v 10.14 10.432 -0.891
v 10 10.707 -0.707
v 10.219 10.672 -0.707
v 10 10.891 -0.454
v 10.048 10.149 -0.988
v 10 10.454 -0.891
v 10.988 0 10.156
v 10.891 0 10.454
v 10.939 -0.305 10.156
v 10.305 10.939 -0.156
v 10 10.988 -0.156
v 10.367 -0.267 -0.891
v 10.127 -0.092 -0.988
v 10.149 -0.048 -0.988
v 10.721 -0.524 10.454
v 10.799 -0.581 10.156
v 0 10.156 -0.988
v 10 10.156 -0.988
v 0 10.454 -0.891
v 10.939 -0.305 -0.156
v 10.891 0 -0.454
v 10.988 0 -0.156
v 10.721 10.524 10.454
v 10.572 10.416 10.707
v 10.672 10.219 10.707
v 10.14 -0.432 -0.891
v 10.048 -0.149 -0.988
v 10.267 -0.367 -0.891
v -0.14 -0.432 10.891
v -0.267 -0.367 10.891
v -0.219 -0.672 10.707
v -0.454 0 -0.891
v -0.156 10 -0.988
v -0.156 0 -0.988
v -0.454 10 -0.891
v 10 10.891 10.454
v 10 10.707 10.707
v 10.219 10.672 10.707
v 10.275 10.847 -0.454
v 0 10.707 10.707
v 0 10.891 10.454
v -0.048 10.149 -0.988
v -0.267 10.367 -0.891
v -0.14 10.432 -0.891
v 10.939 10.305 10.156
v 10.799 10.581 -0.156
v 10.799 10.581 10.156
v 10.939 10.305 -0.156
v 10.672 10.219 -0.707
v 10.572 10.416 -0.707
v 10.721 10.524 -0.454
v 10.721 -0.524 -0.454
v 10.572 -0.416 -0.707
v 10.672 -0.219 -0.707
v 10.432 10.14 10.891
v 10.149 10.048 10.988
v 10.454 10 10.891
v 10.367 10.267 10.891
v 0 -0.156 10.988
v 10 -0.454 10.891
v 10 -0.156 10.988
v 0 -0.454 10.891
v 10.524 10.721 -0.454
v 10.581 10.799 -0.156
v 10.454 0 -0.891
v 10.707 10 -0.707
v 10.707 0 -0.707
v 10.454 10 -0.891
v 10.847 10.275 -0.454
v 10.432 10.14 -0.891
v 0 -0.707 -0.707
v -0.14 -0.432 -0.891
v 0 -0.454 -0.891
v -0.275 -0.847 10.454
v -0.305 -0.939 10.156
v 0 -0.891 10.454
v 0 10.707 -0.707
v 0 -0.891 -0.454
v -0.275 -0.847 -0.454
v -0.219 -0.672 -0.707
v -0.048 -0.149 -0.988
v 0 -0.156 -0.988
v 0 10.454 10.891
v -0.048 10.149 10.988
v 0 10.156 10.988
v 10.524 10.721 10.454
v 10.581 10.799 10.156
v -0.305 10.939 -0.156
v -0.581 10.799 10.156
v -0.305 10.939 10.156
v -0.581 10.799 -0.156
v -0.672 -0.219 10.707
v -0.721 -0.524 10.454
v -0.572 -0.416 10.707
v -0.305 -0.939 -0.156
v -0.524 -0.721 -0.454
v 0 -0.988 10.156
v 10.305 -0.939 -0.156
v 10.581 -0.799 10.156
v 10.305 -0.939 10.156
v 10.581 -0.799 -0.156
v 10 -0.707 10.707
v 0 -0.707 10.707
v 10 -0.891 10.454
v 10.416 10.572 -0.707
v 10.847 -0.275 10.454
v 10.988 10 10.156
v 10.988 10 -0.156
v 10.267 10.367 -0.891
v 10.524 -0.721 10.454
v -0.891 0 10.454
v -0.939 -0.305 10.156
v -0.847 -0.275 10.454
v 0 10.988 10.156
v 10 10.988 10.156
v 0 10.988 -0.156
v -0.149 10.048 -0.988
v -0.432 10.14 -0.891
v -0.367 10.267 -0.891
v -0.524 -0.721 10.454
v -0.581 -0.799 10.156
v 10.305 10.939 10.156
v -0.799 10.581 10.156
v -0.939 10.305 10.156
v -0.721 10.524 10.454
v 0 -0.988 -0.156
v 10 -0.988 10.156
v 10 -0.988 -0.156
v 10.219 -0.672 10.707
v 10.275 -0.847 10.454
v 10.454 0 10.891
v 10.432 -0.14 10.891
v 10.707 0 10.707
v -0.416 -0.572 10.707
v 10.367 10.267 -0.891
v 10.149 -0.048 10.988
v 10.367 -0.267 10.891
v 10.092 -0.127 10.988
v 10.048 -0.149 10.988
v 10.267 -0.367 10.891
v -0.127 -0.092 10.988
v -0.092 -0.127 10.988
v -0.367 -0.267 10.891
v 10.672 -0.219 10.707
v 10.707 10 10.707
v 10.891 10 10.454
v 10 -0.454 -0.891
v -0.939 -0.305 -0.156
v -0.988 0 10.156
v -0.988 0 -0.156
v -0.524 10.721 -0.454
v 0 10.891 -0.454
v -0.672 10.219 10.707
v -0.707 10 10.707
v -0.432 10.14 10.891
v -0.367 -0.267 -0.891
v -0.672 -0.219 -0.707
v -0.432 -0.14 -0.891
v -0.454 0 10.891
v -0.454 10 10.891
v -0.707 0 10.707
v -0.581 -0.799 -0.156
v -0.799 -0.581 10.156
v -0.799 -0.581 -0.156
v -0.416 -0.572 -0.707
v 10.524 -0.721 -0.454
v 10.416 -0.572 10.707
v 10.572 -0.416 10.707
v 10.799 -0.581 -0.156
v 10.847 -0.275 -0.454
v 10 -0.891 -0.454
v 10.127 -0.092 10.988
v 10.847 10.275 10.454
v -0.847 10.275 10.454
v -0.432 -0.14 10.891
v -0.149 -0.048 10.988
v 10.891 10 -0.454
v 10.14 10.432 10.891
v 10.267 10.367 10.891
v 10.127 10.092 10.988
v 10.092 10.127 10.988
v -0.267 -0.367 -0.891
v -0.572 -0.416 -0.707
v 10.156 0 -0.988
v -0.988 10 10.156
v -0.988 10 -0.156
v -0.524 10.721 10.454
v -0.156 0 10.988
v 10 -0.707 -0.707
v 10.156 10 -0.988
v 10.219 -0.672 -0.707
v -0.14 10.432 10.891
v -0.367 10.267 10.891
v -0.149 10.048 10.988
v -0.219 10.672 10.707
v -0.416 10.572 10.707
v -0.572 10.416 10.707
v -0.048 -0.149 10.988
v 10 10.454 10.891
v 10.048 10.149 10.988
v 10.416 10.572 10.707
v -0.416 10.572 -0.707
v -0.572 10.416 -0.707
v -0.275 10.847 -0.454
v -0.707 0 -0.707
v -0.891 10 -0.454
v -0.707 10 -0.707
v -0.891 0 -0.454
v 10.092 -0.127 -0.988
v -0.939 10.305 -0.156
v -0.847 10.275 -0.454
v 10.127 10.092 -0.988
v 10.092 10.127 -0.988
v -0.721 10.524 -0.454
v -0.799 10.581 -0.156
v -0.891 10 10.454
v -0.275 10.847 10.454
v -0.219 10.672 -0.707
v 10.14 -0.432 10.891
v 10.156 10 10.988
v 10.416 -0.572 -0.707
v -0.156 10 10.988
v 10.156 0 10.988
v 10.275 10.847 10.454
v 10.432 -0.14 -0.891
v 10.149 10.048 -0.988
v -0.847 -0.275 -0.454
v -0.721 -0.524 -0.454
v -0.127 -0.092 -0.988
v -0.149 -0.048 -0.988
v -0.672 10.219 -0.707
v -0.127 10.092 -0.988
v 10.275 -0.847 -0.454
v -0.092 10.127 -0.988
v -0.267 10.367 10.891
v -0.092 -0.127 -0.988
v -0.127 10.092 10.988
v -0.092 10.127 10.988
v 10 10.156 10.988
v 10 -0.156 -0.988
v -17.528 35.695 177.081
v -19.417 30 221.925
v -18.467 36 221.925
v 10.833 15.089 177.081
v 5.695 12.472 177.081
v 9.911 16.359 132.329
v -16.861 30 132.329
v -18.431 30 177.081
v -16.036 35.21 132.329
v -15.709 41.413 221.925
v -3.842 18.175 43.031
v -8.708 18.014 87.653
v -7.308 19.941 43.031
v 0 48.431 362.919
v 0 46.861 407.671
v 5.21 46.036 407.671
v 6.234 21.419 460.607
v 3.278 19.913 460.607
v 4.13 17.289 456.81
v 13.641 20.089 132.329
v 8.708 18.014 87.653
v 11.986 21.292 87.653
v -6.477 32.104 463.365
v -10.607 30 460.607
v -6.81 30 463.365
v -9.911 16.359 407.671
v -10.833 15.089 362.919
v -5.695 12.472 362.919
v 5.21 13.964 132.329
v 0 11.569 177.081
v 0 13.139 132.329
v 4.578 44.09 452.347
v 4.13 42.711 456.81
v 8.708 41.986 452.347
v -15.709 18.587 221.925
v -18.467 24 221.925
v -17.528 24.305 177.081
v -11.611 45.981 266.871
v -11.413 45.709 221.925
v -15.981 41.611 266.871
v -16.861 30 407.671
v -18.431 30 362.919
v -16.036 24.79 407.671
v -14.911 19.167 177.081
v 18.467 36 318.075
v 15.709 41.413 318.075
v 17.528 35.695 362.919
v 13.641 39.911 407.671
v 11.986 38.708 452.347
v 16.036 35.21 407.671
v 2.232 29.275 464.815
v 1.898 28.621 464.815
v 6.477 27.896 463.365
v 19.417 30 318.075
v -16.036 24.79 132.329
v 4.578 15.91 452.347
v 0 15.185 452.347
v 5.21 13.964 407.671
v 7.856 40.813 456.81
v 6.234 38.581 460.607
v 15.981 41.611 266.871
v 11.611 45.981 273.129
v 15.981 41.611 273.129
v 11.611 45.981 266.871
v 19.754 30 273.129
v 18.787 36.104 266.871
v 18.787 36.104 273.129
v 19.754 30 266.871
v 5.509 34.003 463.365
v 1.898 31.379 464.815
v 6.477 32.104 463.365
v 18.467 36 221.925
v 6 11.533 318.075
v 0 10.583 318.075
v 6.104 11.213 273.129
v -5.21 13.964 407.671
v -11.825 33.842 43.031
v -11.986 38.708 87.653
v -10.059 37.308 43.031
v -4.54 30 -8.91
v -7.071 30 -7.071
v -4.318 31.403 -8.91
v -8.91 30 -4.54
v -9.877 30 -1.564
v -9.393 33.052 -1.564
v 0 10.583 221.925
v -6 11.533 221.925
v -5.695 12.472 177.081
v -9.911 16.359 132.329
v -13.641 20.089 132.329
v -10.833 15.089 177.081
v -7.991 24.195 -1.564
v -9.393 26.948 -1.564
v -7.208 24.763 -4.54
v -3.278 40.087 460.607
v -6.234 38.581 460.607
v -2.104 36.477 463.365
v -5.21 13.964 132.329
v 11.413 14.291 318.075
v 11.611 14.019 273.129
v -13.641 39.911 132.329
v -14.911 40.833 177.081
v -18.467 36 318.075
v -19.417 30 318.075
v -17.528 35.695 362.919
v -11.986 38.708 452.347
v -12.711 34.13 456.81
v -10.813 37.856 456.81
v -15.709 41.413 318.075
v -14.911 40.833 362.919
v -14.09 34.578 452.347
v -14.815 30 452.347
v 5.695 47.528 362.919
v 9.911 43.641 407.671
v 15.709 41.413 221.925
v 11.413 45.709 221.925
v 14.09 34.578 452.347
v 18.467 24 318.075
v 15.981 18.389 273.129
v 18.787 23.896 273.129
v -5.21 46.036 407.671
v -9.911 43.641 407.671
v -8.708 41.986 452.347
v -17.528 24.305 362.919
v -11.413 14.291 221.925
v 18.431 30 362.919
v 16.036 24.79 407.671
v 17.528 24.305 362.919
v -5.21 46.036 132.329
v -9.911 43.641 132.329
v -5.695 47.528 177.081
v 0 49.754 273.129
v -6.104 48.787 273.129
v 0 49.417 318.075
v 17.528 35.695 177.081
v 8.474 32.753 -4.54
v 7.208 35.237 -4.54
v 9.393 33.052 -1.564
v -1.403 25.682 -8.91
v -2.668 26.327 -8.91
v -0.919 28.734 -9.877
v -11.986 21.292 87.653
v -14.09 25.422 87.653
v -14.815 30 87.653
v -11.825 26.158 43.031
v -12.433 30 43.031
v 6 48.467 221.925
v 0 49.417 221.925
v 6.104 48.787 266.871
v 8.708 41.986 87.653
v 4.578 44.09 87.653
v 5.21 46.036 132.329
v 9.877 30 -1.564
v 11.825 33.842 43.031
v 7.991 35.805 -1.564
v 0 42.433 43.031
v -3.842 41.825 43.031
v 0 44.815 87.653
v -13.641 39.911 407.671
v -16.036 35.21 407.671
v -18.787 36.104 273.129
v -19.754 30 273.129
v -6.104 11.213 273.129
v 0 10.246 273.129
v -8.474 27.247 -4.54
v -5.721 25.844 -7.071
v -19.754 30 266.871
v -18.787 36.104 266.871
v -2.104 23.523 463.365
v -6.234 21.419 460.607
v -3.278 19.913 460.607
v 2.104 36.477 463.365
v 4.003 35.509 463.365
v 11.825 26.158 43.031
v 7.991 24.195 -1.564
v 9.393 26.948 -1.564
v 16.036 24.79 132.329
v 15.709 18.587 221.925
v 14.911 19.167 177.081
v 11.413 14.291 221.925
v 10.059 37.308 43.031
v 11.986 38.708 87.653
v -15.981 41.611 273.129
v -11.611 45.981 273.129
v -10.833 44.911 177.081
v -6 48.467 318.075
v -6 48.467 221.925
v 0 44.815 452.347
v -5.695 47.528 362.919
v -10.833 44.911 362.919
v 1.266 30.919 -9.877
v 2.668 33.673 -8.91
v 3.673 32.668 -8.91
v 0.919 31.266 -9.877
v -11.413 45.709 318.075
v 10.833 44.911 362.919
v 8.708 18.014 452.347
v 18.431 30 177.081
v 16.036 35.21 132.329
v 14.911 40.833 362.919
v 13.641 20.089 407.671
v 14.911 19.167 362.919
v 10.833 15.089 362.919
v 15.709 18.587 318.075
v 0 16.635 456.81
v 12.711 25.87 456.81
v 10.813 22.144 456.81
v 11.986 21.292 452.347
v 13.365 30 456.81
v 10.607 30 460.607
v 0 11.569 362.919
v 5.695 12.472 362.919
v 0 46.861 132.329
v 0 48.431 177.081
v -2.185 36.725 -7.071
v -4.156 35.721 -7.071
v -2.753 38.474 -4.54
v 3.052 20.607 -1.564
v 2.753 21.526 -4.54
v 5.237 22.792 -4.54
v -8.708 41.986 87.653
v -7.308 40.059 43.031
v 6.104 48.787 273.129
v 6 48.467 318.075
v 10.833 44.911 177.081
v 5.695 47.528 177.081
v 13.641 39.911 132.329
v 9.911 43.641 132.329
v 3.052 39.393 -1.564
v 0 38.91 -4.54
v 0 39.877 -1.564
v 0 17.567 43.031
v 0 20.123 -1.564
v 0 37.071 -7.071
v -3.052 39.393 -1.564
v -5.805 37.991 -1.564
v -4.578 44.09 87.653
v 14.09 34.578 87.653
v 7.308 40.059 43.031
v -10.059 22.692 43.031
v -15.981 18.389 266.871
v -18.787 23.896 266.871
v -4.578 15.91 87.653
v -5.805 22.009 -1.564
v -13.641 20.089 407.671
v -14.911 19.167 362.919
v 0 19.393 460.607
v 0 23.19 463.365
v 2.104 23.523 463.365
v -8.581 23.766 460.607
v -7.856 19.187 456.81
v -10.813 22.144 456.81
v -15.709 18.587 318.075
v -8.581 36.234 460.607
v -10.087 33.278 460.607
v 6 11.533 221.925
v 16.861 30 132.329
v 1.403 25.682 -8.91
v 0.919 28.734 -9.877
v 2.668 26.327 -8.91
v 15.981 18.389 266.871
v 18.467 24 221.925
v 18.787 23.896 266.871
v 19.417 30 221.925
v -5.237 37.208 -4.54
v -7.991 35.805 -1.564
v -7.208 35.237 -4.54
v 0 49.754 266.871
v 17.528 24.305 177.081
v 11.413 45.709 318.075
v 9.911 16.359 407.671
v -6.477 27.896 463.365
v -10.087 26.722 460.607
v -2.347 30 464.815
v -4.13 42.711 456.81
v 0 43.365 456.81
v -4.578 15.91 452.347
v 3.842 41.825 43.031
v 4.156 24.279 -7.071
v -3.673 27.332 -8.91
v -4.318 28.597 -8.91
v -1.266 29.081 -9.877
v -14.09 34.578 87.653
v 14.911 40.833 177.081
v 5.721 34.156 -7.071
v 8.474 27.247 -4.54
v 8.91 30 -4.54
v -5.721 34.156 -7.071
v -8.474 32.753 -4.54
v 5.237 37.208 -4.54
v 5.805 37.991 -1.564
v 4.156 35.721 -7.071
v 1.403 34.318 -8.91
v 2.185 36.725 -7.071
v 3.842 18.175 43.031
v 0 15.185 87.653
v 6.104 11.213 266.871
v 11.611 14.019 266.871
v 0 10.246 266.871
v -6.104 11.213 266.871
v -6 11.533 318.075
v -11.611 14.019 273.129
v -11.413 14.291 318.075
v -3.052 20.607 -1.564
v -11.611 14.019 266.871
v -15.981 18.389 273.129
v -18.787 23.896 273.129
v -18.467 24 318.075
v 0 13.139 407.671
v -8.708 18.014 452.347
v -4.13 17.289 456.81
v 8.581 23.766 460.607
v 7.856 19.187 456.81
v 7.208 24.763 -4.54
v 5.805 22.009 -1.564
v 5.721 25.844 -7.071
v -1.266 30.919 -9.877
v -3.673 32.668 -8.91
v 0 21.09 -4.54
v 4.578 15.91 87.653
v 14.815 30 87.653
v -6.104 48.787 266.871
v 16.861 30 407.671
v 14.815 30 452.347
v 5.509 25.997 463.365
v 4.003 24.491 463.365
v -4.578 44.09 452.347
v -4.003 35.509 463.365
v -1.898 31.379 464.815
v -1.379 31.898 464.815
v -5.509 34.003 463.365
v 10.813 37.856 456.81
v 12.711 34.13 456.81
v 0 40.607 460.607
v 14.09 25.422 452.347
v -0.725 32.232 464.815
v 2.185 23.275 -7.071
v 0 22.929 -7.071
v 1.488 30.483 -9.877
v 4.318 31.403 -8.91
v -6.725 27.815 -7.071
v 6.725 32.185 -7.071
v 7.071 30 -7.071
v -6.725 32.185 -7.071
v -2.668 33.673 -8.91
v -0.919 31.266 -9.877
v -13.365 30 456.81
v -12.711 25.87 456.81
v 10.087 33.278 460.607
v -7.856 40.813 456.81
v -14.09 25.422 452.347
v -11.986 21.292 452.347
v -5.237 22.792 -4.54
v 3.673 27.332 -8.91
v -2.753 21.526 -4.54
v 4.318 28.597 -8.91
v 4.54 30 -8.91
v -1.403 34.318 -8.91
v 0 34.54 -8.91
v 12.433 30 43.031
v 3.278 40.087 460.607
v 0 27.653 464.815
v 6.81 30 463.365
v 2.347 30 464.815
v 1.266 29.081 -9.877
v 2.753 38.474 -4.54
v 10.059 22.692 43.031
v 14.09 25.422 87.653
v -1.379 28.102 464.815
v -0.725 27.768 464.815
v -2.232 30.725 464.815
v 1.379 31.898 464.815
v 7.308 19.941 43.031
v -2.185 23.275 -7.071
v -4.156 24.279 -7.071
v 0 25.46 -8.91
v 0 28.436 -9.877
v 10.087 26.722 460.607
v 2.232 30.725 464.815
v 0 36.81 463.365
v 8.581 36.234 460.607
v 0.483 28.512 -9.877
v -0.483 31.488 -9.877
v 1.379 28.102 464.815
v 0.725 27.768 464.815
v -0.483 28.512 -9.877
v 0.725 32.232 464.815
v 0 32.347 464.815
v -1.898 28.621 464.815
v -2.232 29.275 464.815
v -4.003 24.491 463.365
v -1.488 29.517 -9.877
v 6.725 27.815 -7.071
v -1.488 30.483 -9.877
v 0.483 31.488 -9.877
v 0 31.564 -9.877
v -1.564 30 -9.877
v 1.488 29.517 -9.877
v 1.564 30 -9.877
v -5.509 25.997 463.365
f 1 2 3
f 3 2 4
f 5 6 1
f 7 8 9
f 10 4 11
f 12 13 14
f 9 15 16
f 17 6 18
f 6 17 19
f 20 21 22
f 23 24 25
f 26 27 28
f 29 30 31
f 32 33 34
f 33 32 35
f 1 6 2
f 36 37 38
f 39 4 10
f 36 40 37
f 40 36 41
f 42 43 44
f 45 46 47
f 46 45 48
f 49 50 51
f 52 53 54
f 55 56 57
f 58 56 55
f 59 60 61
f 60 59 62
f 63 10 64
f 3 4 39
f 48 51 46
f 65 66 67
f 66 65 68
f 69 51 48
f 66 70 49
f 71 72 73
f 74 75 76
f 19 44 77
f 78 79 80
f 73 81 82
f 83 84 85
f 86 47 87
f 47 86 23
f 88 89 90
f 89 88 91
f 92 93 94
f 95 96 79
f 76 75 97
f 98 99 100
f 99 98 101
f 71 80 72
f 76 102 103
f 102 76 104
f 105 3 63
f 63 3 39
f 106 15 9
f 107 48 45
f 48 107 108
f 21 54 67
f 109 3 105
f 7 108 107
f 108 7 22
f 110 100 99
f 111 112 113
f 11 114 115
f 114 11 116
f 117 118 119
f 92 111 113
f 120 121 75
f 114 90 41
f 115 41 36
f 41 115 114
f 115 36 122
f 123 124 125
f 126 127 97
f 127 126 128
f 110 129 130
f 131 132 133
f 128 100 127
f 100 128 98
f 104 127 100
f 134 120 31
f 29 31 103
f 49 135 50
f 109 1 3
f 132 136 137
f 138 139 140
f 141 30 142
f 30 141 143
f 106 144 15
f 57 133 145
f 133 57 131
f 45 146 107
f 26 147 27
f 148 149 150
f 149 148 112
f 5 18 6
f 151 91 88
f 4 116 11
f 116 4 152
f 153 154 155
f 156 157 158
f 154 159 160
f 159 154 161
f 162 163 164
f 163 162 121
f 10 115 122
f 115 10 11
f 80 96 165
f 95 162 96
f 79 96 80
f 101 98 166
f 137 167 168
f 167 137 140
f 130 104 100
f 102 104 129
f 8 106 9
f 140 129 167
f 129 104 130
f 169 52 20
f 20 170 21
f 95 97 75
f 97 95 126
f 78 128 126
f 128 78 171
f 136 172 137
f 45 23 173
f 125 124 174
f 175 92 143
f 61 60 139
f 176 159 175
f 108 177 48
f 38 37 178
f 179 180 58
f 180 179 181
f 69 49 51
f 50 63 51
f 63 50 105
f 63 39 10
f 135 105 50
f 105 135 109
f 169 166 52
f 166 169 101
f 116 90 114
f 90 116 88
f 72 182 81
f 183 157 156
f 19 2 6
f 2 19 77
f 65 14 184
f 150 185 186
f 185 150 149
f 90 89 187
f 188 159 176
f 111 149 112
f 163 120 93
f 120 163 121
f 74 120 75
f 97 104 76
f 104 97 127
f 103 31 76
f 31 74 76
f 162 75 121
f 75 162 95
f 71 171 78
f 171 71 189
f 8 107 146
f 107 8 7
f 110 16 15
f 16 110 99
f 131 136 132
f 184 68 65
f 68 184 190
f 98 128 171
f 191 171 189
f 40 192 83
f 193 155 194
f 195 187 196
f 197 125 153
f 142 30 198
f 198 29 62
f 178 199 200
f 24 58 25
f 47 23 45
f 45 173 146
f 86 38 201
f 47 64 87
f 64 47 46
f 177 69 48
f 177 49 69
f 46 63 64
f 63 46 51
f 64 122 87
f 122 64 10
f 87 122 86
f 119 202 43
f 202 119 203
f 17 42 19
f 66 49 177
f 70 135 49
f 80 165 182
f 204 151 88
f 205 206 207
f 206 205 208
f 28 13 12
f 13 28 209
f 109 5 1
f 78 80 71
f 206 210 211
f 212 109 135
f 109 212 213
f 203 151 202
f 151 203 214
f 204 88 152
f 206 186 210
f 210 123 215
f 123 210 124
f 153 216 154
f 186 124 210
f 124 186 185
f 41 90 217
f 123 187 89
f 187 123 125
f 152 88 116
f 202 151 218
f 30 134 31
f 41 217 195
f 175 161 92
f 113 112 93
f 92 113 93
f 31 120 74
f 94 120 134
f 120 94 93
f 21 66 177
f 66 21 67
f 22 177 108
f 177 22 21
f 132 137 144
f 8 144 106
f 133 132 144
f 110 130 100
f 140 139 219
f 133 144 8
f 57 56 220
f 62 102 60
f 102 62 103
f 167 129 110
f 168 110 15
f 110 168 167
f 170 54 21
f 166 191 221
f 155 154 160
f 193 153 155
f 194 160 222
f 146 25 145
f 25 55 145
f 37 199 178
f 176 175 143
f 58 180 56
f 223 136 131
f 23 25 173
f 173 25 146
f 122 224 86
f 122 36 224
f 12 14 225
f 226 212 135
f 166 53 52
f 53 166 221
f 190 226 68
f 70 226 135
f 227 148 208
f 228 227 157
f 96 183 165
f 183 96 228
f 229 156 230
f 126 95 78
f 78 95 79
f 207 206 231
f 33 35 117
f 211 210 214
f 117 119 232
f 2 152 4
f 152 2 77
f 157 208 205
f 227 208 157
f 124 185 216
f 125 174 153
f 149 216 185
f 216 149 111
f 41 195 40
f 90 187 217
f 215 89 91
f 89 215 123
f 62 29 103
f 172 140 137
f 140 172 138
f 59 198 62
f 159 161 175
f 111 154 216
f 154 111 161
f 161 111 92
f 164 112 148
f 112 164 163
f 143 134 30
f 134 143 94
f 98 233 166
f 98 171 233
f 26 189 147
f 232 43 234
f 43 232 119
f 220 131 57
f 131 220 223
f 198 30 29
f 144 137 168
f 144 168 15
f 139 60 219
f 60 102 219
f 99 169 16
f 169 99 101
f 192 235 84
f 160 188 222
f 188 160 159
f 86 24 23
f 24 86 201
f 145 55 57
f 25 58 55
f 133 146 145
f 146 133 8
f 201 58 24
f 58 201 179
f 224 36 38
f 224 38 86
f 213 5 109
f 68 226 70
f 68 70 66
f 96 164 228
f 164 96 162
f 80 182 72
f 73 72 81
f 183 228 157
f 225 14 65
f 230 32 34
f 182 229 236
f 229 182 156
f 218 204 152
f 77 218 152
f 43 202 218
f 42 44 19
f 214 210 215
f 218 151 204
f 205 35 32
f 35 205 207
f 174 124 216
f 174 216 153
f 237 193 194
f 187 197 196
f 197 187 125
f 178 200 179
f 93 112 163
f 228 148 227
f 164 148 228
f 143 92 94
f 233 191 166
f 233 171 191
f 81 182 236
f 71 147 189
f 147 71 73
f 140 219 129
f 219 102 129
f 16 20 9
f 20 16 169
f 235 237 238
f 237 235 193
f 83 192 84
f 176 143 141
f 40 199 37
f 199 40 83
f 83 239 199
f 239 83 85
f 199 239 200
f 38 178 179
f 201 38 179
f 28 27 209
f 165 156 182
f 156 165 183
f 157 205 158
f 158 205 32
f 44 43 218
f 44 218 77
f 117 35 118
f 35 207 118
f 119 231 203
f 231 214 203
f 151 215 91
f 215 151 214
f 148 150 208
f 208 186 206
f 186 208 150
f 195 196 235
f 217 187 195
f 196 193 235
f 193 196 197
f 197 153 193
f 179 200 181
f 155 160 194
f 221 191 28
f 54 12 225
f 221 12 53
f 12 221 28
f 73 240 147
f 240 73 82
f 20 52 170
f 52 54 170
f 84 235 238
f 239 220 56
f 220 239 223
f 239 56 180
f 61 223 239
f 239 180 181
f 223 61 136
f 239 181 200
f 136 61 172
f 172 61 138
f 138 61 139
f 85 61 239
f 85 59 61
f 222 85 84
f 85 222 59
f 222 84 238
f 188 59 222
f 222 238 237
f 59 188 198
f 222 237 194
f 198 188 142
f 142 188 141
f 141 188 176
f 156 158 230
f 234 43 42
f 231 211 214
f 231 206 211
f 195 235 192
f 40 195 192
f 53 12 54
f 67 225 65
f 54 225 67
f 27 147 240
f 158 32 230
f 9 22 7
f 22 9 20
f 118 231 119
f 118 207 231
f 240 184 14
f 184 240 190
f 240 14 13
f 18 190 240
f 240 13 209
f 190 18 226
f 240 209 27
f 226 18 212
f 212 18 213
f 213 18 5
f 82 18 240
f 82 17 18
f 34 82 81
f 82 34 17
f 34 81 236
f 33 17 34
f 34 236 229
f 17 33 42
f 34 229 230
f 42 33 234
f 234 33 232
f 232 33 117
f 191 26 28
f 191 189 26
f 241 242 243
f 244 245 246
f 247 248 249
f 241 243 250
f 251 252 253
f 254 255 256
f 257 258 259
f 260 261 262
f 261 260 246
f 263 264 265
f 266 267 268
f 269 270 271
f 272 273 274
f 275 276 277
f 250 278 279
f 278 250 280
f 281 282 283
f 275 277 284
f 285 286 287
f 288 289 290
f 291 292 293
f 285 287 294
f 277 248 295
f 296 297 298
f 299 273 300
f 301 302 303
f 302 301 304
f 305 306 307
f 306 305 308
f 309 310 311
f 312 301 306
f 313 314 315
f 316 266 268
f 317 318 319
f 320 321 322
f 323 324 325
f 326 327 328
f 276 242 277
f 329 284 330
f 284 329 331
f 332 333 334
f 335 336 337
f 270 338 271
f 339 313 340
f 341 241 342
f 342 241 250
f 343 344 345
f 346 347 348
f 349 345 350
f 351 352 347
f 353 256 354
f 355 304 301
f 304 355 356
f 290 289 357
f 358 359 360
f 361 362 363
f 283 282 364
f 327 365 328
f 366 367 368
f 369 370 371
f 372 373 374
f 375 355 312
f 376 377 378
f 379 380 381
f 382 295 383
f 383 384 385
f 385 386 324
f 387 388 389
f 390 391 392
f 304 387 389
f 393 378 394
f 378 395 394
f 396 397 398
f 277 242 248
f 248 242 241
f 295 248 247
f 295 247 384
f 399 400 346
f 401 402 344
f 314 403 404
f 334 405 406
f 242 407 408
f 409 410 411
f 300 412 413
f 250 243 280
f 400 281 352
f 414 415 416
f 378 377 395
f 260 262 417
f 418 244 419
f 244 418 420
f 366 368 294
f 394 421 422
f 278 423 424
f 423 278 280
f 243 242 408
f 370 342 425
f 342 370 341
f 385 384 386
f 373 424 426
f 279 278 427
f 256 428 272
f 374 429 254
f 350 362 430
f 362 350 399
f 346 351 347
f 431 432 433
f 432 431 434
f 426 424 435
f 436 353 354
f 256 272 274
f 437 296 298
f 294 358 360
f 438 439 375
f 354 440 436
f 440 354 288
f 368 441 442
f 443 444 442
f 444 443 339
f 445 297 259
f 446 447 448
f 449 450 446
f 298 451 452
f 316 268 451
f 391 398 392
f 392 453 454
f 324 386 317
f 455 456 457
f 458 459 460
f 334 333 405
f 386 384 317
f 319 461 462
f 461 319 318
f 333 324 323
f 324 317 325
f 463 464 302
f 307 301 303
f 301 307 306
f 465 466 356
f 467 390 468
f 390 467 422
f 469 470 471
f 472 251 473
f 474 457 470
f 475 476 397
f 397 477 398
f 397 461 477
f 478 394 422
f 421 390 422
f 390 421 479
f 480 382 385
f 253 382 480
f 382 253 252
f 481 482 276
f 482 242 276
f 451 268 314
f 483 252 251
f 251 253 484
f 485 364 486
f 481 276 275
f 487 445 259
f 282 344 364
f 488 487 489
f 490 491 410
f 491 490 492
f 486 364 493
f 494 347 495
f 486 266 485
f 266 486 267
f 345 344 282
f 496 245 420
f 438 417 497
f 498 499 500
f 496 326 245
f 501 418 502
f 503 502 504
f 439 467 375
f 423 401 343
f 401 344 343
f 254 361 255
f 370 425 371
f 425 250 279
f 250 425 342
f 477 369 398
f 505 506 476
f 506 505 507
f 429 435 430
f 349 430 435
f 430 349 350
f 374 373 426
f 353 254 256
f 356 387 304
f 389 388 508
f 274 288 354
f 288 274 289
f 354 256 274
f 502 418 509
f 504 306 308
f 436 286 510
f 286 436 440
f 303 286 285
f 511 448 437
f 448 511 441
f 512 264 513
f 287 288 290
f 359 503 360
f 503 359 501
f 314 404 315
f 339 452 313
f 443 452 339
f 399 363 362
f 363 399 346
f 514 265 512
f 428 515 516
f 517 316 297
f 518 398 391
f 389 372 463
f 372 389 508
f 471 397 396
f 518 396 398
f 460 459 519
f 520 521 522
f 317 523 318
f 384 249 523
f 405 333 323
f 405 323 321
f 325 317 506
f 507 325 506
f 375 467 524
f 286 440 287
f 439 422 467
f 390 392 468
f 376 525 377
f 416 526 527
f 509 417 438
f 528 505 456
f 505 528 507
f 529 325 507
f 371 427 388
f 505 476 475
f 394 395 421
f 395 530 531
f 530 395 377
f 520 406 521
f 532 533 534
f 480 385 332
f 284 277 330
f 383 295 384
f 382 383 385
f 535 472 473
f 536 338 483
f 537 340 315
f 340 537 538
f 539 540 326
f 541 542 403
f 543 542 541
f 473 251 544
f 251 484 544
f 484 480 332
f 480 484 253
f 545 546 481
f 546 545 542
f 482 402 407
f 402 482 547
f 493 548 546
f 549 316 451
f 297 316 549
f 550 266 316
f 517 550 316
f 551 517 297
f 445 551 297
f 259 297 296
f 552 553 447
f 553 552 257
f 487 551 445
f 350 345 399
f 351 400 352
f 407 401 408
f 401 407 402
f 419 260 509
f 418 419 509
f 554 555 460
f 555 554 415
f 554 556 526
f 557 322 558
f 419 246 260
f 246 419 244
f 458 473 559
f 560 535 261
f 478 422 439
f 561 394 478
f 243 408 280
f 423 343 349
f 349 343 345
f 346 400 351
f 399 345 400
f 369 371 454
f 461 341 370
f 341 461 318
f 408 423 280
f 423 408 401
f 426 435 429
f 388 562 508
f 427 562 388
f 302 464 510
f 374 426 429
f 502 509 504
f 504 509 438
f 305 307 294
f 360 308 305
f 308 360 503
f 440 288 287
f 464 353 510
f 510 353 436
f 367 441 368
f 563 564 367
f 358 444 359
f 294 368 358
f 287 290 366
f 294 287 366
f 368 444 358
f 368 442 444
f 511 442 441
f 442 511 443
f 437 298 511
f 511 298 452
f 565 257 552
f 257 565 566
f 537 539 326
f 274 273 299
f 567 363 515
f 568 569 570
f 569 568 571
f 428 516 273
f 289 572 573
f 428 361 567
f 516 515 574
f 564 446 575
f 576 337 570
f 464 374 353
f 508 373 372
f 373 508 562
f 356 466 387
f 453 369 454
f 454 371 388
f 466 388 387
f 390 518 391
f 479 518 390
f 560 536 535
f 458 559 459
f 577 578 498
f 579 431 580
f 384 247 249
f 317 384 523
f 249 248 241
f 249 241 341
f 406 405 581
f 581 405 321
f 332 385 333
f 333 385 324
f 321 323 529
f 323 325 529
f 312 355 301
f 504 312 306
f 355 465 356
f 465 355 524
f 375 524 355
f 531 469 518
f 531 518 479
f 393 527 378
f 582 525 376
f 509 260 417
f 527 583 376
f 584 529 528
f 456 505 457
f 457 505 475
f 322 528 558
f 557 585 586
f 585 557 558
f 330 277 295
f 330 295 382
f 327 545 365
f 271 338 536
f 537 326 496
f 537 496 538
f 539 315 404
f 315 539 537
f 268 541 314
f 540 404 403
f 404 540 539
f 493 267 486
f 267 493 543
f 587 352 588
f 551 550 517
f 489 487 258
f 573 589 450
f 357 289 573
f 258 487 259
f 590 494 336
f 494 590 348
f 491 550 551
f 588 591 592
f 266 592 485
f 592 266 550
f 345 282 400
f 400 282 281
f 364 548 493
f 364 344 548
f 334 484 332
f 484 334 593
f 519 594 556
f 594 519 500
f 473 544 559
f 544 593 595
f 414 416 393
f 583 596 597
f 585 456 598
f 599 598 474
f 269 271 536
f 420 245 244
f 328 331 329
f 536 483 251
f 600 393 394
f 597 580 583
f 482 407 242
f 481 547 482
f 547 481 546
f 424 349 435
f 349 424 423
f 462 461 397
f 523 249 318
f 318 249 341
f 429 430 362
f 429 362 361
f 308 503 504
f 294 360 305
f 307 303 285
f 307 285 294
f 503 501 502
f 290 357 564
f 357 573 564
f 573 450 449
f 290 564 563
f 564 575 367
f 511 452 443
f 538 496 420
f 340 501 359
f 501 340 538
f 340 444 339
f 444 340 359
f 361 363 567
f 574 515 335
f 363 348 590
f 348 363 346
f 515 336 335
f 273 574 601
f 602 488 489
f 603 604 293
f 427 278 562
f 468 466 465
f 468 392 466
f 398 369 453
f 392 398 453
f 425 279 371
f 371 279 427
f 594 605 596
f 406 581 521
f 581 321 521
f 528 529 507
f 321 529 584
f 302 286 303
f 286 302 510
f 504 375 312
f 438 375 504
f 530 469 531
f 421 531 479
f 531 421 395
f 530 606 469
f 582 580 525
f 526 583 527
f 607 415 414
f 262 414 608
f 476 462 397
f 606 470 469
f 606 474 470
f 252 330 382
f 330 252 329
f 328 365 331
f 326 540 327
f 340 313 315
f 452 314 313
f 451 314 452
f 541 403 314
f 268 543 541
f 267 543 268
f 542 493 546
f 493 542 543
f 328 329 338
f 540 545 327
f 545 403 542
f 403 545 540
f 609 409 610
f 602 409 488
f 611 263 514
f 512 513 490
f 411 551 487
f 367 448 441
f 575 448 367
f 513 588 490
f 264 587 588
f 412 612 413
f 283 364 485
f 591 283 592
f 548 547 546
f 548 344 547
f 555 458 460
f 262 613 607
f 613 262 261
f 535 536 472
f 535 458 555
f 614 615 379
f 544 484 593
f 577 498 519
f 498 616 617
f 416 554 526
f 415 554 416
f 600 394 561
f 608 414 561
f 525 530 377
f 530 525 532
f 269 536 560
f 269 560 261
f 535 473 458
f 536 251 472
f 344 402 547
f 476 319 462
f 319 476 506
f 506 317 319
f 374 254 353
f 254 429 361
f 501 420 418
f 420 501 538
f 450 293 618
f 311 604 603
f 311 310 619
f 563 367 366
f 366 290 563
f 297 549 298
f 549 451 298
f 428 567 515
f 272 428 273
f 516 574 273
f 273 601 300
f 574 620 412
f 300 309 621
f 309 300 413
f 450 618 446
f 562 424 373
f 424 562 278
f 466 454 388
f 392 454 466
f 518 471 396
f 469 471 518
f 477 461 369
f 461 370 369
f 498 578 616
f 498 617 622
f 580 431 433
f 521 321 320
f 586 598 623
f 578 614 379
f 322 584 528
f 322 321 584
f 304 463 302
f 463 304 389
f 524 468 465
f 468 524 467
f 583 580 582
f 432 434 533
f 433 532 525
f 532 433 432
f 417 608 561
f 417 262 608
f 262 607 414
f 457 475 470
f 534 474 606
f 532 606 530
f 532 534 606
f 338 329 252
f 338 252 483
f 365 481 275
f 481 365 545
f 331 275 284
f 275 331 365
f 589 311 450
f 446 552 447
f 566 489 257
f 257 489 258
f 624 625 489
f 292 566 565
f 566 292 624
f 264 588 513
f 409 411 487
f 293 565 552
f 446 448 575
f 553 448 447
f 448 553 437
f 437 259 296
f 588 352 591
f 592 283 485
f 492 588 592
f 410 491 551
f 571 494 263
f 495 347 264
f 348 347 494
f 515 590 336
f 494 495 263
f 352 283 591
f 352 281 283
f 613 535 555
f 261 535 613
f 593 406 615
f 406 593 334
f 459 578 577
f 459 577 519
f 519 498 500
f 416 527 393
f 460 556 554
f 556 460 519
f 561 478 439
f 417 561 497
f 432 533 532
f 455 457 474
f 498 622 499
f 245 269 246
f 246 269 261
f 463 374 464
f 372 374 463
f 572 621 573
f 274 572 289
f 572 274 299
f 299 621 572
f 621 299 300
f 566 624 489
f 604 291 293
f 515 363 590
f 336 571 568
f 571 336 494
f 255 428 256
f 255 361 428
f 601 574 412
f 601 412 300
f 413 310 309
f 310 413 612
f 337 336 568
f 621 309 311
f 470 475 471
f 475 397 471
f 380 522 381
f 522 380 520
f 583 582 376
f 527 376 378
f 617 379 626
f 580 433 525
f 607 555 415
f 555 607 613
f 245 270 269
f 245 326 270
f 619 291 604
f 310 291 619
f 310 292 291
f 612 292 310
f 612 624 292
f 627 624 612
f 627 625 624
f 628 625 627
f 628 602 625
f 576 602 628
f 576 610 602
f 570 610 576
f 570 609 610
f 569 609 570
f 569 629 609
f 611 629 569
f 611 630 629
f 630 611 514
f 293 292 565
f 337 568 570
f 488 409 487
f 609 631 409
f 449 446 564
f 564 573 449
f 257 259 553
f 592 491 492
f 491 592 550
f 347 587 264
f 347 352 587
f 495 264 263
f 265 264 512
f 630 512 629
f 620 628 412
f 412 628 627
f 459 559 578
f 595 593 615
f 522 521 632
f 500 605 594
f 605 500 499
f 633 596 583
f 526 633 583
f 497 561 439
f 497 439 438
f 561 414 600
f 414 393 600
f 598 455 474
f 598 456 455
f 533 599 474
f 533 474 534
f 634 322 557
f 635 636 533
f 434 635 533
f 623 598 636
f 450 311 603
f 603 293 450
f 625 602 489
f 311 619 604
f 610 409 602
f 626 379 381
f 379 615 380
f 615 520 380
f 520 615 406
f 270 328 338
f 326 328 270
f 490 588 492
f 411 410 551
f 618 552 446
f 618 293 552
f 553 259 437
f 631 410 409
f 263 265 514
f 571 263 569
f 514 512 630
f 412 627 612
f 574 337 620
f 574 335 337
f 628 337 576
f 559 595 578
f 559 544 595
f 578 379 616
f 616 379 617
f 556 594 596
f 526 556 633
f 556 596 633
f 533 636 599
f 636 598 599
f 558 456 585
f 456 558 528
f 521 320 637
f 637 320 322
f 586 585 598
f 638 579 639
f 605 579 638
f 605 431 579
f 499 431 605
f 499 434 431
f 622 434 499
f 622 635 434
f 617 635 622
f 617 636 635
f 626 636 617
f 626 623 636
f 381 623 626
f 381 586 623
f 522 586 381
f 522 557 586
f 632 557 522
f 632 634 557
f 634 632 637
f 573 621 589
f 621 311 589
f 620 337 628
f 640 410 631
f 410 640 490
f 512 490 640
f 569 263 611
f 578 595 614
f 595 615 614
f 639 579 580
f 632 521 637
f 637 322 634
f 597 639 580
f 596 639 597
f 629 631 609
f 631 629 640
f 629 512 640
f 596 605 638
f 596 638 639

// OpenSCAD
// experiment one. 
// place a bunch of points and hull them into a solid


points = [ [0,0,0],
           [10, 0, 0],
           [10, 10, 0],
           [0, 10, 0],
           [0,0, 10],
           [10, 0, 10],
           [10, 10, 10],
           [0, 10, 10] ];
           
hull() 
for (i = [0 : 1 : 8]) {
    translate(points[i]) sphere(r=1, $fn=20);
}

rs = [ 3, 3.1, 3.3, 3.7, 4.0, 3.7, 3.3, 3.1, 3.0, ];

hull() {
    for (i = [0 : 3 : 30]) {
        translate([0,30,i*15]) sphere(r=10*sin(i*5)+10, $fn=20);
    }
}
